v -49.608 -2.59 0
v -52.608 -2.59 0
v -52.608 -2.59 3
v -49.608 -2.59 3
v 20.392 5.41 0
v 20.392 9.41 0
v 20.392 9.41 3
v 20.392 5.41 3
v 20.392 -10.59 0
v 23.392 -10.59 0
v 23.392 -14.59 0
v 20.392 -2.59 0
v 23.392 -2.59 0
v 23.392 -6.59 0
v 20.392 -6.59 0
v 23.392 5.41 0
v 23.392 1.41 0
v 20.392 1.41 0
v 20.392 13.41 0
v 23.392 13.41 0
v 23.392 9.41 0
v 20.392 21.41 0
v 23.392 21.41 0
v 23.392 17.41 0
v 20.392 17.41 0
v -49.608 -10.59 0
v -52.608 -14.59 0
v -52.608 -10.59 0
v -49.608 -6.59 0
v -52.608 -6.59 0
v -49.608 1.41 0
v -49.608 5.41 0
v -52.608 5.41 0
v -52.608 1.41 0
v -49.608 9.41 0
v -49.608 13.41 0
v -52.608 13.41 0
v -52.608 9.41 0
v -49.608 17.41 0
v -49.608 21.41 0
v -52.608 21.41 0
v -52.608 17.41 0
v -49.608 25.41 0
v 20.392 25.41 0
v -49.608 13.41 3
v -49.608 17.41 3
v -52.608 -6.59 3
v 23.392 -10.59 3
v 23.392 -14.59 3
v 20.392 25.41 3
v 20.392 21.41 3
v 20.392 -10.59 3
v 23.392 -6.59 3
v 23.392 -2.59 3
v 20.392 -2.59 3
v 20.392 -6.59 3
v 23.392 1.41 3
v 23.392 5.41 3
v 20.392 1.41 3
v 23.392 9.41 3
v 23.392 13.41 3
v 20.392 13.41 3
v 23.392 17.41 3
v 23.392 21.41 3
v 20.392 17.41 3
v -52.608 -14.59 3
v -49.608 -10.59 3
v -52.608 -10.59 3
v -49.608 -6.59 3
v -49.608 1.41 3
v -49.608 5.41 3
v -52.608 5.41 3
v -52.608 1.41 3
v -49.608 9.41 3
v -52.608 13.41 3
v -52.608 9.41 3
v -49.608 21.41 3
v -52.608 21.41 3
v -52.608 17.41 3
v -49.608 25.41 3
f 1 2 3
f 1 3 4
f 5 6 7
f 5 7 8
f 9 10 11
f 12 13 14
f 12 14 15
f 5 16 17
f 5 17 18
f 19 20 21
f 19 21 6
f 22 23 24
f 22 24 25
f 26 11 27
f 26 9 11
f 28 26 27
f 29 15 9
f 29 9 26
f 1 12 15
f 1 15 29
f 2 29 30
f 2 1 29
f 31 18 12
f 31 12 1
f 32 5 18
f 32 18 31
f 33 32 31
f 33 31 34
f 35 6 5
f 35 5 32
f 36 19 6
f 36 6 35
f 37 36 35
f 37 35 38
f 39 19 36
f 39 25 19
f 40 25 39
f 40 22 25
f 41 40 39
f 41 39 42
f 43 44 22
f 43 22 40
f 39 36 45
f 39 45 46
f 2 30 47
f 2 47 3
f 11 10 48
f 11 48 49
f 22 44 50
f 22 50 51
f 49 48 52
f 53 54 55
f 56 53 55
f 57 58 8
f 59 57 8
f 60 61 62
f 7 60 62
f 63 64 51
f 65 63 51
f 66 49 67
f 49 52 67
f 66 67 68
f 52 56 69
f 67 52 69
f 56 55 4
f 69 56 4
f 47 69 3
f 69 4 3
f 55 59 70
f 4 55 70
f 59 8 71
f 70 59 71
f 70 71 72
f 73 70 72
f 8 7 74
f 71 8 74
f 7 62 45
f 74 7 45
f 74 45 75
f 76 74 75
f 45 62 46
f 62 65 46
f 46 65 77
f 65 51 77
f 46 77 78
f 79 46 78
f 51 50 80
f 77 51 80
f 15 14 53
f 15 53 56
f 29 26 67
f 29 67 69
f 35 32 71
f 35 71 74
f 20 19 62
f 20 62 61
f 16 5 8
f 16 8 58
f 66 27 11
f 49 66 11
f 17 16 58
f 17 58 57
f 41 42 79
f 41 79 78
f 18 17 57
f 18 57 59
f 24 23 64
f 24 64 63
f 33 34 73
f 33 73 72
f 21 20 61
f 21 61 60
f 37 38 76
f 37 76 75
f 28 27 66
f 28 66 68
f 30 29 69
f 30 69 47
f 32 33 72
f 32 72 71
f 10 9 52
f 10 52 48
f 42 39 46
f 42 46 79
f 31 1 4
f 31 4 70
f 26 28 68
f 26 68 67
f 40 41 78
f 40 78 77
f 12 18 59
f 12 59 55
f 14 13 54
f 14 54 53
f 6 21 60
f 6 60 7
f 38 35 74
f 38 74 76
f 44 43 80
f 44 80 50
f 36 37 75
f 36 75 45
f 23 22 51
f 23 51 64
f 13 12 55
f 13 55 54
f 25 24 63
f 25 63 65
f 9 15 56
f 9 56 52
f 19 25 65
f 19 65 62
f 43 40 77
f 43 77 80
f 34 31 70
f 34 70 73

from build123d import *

# Parameters (mm, degrees)
BOSS_EXTRU_1_DEPTH = 3


with BuildPart() as part:
    # Esquisse1 → Boss.-Extru.1 (new body)
    with BuildSketch(Plane.XY):
        Polygon((-49.608259545, 25.410202795), (20.391740455, 25.410202795), (20.391740455, 21.410202795), (23.391740455, 21.410202795), (23.391740455, 17.410202795), (20.391740455, 17.410202795), (20.391740455, 13.410202795), (23.391740455, 13.410202795), (23.391740455, 9.410202795), (20.391740455, 9.410202795), (20.391740455, 5.410202795), (23.391740455, 5.410202795), (23.391740455, 1.410202795), (20.391740455, 1.410202795), (20.391740455, -2.589797205), (23.391740455, -2.589797205), (23.391740455, -6.589797205), (20.391740455, -6.589797205), (20.391740455, -10.589797205), (23.391740455, -10.589797205), (23.391740455, -14.589797205), (20.391740455, -14.589797205), (-49.608259545, -14.589797205), (-52.608259545, -14.589797205), (-52.608259545, -10.589797205), (-49.608259545, -10.589797205), (-49.608259545, -6.589797205), (-52.608259545, -6.589797205), (-52.608259545, -2.589797205), (-49.608259545, -2.589797205), (-49.608259545, 1.410202795), (-52.608259545, 1.410202795), (-52.608259545, 5.410202795), (-49.608259545, 5.410202795), (-49.608259545, 9.410202795), (-52.608259545, 9.410202795), (-52.608259545, 13.410202795), (-49.608259545, 13.410202795), (-49.608259545, 17.410202795), (-52.608259545, 17.410202795), (-52.608259545, 21.410202795), (-49.608259545, 21.410202795), align=None)
    extrude(amount=BOSS_EXTRU_1_DEPTH)


solid = part.part
